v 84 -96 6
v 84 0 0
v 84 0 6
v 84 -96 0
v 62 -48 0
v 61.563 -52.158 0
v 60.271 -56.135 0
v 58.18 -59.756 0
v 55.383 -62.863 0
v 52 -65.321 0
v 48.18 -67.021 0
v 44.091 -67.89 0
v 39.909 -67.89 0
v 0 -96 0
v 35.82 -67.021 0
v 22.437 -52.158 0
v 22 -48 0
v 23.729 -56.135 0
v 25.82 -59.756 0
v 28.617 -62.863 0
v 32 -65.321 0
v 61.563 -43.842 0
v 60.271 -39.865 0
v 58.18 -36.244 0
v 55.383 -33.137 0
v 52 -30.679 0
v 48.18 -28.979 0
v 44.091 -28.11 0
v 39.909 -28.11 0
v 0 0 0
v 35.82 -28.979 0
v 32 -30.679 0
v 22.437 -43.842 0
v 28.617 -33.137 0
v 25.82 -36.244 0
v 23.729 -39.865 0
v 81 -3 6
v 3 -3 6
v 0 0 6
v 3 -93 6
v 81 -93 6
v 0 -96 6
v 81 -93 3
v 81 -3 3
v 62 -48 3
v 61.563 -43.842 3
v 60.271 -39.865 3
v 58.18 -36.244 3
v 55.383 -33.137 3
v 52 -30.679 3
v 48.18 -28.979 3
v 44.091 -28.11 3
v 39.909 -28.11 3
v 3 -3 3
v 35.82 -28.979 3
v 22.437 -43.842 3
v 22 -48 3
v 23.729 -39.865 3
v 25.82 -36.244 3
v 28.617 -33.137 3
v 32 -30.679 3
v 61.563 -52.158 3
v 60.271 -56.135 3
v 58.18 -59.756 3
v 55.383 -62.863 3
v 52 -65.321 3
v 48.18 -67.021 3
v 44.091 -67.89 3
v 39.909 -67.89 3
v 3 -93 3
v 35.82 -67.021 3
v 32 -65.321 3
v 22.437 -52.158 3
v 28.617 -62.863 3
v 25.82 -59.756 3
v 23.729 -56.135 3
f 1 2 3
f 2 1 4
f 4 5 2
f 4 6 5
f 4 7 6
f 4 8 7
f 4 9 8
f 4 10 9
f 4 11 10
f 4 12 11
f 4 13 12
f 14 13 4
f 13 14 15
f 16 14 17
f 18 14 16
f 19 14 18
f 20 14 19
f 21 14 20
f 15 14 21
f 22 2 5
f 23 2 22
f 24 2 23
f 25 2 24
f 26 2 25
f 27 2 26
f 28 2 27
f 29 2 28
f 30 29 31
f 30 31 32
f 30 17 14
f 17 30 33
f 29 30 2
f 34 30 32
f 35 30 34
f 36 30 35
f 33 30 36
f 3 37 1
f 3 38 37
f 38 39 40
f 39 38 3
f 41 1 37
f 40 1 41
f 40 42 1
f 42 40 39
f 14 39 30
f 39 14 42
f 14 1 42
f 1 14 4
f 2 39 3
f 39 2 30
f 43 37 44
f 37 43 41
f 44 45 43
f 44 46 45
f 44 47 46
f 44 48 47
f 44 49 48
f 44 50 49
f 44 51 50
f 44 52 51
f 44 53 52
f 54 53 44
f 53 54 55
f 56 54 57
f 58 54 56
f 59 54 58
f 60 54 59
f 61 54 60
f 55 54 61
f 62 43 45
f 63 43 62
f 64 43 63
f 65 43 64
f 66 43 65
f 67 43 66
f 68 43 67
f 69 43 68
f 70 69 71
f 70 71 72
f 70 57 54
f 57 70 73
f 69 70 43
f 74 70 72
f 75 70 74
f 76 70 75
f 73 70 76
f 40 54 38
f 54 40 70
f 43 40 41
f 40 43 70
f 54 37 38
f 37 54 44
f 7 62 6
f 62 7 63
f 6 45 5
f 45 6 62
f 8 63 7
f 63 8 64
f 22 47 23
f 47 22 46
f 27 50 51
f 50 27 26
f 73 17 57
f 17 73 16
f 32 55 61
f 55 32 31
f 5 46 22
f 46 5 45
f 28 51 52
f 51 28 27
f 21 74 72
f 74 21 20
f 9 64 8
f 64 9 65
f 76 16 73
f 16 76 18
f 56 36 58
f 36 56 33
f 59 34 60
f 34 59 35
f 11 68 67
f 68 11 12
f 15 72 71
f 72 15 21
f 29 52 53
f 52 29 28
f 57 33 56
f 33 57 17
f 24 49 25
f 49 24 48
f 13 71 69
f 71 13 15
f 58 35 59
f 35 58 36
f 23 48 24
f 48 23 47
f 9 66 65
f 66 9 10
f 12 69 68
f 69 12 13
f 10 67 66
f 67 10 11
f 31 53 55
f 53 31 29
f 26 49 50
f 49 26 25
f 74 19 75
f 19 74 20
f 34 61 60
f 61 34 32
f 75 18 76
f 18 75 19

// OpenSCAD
cutoutDiameter = 40; // [5:100]

zTranslate = nejeLaserEngraverDiskJig_zLength();

translate([0,0,zTranslate])
rotate([180, 0, 0])
nejeLaserEngraverDiskJig(diameter = cutoutDiameter);



module nejeLaserEngraverDiskJig(diameter = 40)
{
	bed_xLength = nejeDk8KzBed_xLength();
	bed_yLength = nejeDk8KzBed_yLength();
	bed_zLength = nejeDk8KzBed_zLength();

	xyIncrease = 3 * 2;

	xLength = nejeDk8KzBed_xLength() + xyIncrease;
	yLength = nejeDk8KzBed_yLength() + xyIncrease;
	zLength = nejeLaserEngraverDiskJig_zLength();

	difference()
	{
		nejeLaserEngraverDiskJig_block(bed_xLength, bed_yLength, bed_zLength,
						 			   xLength, yLength, zLength);

		nejeLaserEngraverDiskJig_cutout(diameter, xLength, yLength, zLength);
	}
}

/** Support functions and modules follow. **/

function nejeLaserEngraverDiskJig_zLength() = nejeDk8KzBed_zLength() * 2;

module nejeLaserEngraverDiskJig_block(bed_xLength, bed_yLength, bed_zLength,
				 					  xLength, yLength, zLength)
{
	laserEngraverJig(bed_xLength, bed_yLength, bed_zLength,
					 xLength, yLength, zLength);
}

module nejeLaserEngraverDiskJig_cutout(diameter, xLength, yLength, zLength)
{
	radius = diameter / 2.0;
	xTranslate = xLength / 2.0;
	yTranslate = yLength / 2.0;
	translate([xTranslate, yTranslate, -0.01])
	cylinder(r=radius, h=10);
}

module laserEngraverJig(bed_xLength, bed_yLength, bed_zLength,
						xLength, yLength, zLength)
{
	laserEngraverJig_base(bed_xLength, bed_yLength, bed_zLength,
						  xLength, yLength, zLength);
}

/** Support functions and modules follow. **/

module laserEngraverJig_base(bed_xLength, bed_yLength, bed_zLength,
							 xLength, yLength, zLength)
{
	difference()
	{
		// main block
		cube([xLength, yLength, zLength]);

		// bed cutout
		xTranslate = (xLength - bed_xLength) / 2.0;
		yTranslate = (yLength - bed_yLength) / 2.0;
		color("green")
		translate([xTranslate, yTranslate, -0.01])
		cube([bed_xLength, bed_yLength, bed_zLength + 0.01]);
	}
}

module nejeDk8KzBed()
{
	xLength = nejeDk8KzBed_xLength();
	yLength = nejeDk8KzBed_yLength();
	zLength = nejeDk8KzBed_zLength();

	cube([xLength, yLength, zLength]);
}

/** Support functions and modules follow. **/

function nejeDk8KzBed_xLength() = 78;

function nejeDk8KzBed_yLength() = 90;

function nejeDk8KzBed_zLength() = 3;
